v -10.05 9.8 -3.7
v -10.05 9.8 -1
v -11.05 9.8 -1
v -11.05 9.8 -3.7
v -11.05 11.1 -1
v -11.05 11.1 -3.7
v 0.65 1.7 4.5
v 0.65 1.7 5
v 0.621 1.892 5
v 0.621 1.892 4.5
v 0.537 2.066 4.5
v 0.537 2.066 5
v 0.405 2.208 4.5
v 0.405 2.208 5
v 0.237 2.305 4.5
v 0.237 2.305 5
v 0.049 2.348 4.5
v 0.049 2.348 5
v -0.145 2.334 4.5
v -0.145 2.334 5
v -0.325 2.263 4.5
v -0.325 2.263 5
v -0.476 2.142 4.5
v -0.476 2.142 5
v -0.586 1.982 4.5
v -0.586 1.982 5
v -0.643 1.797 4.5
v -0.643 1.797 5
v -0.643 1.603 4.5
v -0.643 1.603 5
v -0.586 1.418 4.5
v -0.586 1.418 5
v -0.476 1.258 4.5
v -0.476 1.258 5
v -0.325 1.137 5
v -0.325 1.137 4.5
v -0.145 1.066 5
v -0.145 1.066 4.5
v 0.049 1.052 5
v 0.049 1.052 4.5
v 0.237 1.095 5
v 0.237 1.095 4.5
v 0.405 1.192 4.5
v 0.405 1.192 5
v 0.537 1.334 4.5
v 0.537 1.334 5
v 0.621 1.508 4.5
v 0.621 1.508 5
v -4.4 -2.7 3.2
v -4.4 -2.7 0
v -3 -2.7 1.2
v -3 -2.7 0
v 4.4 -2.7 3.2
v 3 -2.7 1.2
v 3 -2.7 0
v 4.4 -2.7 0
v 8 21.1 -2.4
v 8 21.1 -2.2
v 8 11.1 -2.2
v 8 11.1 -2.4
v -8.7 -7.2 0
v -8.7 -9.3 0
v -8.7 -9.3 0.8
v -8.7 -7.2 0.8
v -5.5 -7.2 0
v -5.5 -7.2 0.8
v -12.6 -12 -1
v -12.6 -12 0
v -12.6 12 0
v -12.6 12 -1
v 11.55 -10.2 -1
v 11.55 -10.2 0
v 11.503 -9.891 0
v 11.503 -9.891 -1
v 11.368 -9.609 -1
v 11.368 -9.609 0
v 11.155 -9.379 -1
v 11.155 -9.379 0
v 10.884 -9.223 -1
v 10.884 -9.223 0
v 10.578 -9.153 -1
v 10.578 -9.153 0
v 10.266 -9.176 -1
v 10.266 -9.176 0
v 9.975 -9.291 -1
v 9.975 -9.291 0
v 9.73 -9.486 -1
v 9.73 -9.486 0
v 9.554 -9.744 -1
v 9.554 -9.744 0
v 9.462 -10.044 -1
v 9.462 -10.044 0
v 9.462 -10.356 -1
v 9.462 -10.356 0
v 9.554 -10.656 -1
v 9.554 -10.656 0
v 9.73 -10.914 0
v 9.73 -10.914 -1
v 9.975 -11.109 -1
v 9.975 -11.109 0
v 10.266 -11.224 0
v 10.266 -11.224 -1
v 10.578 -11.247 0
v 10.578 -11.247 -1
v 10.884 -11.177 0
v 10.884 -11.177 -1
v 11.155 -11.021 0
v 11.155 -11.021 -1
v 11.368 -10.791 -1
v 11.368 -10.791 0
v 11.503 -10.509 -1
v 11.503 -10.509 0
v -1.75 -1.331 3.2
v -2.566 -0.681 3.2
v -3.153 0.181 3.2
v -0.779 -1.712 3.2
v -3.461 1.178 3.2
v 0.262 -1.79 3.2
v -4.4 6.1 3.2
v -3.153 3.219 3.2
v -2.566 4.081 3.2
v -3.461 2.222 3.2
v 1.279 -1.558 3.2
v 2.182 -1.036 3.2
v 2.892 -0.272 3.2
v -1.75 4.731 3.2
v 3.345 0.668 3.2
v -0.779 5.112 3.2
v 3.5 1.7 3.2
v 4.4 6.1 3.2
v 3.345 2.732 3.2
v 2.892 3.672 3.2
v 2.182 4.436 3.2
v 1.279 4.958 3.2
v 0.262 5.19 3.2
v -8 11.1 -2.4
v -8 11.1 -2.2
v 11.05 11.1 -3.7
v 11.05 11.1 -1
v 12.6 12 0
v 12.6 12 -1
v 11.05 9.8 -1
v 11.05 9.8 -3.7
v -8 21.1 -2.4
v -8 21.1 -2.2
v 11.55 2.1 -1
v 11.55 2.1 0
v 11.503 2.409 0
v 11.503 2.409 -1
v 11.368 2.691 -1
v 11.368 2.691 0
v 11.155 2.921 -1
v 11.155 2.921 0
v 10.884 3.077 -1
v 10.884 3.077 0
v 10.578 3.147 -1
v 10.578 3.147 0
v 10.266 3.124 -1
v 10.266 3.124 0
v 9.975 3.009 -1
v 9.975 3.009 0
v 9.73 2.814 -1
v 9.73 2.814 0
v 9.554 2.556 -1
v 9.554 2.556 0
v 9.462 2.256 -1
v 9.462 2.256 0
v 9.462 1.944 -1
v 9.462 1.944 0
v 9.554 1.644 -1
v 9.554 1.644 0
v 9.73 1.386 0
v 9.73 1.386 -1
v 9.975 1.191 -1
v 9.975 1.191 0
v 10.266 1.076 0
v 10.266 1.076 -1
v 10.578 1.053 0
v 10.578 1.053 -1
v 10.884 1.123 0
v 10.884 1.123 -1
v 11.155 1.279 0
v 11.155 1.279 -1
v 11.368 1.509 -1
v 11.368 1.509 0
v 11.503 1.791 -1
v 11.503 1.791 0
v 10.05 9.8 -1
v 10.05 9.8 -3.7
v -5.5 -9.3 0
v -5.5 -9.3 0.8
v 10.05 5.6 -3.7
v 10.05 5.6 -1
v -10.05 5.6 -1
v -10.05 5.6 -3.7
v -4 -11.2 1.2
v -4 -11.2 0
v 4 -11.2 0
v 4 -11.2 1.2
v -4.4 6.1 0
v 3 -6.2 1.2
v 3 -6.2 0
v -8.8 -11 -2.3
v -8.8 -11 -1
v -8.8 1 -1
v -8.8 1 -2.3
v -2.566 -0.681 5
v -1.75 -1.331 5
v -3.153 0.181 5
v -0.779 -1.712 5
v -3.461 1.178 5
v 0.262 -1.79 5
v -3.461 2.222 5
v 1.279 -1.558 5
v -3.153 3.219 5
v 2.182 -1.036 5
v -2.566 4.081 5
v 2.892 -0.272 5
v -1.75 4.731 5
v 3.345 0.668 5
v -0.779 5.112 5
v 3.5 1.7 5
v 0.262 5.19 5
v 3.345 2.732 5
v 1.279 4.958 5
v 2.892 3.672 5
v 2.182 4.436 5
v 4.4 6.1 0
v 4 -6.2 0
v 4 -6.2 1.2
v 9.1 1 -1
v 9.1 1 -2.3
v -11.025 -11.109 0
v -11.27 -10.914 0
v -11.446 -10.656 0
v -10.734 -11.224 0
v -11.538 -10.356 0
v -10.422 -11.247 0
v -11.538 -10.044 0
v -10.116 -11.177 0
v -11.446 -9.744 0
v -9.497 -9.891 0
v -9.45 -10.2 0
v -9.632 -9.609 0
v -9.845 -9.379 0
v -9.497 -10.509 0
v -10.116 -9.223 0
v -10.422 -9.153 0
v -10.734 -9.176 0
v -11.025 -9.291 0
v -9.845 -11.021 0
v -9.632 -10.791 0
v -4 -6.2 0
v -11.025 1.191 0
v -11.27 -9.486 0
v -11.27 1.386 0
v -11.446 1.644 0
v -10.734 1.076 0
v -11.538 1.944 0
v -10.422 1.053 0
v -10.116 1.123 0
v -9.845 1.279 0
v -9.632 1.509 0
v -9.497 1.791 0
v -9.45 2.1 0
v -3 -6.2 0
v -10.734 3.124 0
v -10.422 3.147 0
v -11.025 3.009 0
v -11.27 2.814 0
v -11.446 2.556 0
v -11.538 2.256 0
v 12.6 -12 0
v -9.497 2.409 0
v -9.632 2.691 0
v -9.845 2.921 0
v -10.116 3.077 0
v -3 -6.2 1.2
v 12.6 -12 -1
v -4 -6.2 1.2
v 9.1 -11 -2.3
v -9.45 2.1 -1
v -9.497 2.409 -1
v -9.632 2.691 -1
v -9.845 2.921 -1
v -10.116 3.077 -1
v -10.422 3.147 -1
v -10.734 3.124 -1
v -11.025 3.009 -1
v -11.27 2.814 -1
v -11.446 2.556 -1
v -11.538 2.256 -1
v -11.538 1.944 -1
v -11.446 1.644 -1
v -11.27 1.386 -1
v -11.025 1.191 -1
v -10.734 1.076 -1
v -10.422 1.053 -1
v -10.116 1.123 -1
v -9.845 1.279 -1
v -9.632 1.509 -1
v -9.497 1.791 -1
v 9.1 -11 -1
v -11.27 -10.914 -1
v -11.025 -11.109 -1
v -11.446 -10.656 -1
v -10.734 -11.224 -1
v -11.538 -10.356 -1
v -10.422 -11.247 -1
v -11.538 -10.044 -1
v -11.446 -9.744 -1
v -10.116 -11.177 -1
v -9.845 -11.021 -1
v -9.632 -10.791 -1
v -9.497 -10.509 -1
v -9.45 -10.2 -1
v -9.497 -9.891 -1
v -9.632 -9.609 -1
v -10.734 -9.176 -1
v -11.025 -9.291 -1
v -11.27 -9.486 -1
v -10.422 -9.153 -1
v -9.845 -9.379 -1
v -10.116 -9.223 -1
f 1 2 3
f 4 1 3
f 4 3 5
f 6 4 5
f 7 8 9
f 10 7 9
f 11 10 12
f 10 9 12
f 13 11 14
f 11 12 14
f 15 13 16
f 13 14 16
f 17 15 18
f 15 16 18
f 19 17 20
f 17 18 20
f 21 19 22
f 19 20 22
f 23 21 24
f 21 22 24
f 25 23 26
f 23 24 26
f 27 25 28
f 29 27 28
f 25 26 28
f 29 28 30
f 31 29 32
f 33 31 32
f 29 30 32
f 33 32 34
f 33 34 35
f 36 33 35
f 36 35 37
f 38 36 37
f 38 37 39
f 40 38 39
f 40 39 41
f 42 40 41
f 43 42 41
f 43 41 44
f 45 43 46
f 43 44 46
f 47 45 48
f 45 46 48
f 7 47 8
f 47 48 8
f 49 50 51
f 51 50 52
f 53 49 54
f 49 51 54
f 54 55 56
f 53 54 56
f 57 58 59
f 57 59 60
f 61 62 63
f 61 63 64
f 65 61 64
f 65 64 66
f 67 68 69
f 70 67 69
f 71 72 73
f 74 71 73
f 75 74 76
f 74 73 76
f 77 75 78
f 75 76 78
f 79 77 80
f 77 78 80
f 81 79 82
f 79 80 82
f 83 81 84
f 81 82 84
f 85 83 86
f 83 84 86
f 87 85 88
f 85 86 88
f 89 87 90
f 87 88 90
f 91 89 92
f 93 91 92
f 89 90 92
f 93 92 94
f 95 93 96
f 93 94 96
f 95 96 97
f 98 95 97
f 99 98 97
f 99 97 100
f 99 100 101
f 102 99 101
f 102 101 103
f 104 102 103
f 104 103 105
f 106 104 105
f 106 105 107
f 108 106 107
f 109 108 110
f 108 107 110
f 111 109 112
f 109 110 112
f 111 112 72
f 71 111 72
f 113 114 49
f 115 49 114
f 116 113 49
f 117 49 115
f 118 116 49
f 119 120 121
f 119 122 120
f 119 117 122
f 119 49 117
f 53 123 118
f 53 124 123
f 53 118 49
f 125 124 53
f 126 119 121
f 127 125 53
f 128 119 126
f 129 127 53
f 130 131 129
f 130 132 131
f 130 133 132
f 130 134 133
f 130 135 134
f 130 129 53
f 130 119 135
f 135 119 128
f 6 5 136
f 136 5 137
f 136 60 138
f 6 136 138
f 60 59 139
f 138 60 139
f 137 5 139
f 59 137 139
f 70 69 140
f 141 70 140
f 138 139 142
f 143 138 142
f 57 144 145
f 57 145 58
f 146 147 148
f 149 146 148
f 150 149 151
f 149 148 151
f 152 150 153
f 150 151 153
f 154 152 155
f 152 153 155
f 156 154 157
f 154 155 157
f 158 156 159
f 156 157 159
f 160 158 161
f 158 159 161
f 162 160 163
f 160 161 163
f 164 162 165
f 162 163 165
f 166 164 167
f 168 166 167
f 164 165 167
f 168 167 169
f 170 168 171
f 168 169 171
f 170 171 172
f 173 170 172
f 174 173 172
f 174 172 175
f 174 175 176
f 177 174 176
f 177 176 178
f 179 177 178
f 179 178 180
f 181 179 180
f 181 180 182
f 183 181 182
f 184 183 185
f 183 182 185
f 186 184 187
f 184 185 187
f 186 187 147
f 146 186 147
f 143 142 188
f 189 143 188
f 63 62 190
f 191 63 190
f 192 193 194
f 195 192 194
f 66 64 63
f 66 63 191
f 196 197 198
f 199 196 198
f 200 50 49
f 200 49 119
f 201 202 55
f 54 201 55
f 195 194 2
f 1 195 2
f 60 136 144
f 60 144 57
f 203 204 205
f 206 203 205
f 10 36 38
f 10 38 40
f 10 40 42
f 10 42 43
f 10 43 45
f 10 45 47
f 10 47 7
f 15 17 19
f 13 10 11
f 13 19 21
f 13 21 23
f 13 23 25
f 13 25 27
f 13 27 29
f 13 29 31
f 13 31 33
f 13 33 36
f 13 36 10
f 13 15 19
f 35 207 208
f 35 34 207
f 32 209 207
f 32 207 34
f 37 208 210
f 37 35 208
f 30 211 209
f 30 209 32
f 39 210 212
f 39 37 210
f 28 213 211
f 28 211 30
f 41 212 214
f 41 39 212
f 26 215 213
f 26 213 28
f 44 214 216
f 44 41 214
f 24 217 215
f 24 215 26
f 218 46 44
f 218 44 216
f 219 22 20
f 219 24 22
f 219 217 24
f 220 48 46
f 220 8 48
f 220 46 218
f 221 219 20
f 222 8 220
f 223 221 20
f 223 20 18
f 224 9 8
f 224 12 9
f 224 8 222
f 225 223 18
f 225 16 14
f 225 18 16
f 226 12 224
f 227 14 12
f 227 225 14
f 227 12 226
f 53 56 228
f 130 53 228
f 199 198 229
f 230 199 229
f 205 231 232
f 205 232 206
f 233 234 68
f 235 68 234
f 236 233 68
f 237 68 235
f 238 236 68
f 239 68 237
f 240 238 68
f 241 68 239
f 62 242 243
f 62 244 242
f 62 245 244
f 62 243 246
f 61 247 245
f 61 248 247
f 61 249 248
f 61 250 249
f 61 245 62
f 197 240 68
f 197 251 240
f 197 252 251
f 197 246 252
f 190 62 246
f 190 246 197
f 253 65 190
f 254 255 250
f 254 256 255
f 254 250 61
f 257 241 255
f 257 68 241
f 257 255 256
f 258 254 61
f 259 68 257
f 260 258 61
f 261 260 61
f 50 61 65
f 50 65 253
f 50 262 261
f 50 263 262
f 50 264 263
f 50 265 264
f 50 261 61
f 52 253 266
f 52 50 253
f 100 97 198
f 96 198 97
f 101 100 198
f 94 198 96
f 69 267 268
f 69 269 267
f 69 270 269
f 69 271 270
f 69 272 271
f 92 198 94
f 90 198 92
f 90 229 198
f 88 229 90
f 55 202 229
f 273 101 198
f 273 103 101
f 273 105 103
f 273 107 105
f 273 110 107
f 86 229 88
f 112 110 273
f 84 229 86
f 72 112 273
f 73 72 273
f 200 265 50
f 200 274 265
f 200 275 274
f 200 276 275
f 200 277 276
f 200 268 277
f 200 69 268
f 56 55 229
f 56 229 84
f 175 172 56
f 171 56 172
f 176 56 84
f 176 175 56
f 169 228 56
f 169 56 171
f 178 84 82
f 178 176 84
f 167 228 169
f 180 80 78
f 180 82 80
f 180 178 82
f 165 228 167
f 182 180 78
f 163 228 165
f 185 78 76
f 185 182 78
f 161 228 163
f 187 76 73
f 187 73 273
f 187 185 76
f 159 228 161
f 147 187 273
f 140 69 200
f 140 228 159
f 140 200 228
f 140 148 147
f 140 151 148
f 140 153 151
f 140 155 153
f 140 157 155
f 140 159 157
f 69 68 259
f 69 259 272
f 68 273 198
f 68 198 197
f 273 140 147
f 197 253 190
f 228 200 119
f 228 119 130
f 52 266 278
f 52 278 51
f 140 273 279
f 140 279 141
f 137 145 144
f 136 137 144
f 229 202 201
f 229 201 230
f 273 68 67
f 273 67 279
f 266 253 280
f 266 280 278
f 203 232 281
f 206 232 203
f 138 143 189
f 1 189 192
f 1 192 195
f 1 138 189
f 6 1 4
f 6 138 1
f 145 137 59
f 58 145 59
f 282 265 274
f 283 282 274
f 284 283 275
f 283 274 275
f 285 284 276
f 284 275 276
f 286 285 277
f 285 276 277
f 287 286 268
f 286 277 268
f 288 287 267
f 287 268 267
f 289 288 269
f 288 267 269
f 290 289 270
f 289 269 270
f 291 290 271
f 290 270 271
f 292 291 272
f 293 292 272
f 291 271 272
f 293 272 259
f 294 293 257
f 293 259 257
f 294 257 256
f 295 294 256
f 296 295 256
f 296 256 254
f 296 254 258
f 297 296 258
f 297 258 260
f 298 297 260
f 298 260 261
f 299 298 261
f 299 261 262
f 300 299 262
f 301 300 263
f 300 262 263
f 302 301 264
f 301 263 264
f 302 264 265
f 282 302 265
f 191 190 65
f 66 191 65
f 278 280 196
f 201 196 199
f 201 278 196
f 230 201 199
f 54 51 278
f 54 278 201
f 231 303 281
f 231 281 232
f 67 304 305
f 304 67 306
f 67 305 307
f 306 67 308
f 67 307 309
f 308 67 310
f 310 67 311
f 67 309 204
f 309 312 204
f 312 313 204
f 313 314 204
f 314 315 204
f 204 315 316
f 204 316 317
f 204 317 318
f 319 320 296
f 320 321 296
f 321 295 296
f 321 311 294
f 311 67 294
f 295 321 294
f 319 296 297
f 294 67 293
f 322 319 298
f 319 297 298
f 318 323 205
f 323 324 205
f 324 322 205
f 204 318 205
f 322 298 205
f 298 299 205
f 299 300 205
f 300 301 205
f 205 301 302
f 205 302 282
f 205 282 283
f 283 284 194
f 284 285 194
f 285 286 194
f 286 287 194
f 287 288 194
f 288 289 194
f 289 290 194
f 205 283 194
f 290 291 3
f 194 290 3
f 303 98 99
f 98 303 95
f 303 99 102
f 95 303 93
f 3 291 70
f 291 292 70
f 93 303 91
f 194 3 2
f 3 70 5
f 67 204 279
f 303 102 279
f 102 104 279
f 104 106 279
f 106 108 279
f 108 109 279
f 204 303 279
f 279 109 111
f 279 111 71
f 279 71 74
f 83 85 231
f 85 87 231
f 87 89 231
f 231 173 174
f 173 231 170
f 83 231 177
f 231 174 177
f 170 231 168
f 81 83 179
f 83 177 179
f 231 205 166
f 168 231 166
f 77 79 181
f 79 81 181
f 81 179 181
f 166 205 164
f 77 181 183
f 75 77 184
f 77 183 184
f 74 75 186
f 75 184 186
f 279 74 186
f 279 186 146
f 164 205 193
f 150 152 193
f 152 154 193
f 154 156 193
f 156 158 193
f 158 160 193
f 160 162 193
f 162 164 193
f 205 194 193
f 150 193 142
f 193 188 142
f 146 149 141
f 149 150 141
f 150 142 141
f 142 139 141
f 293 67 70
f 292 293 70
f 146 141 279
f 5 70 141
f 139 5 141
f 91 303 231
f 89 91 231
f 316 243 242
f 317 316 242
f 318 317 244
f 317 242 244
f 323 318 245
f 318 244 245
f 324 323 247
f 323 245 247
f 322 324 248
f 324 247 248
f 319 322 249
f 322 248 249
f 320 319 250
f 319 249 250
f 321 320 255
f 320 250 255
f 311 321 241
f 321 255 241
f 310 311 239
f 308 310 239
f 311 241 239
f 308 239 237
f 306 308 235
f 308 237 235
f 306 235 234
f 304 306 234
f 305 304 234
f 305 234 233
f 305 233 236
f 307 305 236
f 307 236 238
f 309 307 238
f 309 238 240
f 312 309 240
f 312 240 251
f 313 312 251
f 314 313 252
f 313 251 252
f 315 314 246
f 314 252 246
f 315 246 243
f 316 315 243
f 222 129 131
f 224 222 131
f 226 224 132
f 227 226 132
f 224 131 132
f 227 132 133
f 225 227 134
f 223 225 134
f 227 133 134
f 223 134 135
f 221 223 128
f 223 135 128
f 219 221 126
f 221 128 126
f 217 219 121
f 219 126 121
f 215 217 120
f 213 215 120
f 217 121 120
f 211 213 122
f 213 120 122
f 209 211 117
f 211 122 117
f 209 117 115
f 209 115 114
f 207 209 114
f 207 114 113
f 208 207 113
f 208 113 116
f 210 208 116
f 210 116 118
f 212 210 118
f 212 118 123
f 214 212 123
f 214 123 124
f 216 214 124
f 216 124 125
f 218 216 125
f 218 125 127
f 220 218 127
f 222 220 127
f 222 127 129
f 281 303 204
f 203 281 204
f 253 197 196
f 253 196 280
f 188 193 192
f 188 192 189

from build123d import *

# Parameters (mm, degrees)
SKICA1_W                 = 25.2
SKICA1_H                 = 24
SKICA1_R                 = 1.05
SKICA1_W_2               = 8.8
SKICA1_H_2               = 8.8
SKICA1_R_2               = 3.5
P_IDAT_VYSUNUT_M1_DEPTH  = 1
SKICA1_3_W               = 8.8
SKICA1_3_H               = 8.8
SKICA1_3_R               = 3.5
P_IDAT_VYSUNUT_M2_DEPTH  = 3.2
SKICA1_4_R               = 3.5
P_IDAT_VYSUNUT_M3_DEPTH  = 5
SKICA2_W                 = 8
SKICA2_H                 = 5
SKICA2_W_2               = 6
SKICA2_H_2               = 3.5
P_IDAT_VYSUNUT_M4_DEPTH  = 1.2
SKICA3_W                 = 20.1
SKICA3_H                 = 4.2
P_IDAT_VYSUNUT_M5_DEPTH  = 2.7
SKICA4_W                 = 17.9
SKICA4_H                 = 12
P_IDAT_VYSUNUT_M6_DEPTH  = 1.3
SKICA5_W                 = 3.2
SKICA5_H                 = 2.1
P_IDAT_VYSUNUT_M7_DEPTH  = 0.8
SKICA6_R                 = 0.65
ODEBRAT_VYSUNUT_M1_DEPTH = 0.5
SKICA7_W                 = 16
SKICA7_H                 = 0.2
P_IDAT_VYSUNUT_M9_DEPTH  = 10


with BuildPart() as part:
    # Skica1 → P_idat vysunut_m1 (new body)
    with BuildSketch(Plane.XY):
        Rectangle(SKICA1_W, SKICA1_H)
        with Locations((10.5, 2.1)):
            Circle(SKICA1_R, mode=Mode.SUBTRACT)
        with Locations((-10.5, 2.1)):
            Circle(SKICA1_R, mode=Mode.SUBTRACT)
        with Locations((10.5, -10.2)):
            Circle(SKICA1_R, mode=Mode.SUBTRACT)
        with Locations((-10.5, -10.2)):
            Circle(SKICA1_R, mode=Mode.SUBTRACT)
        with Locations((0, 1.7)):
            Rectangle(SKICA1_W_2, SKICA1_H_2, mode=Mode.SUBTRACT)
        with Locations((0, 1.7)):
            Rectangle(SKICA1_W_2, SKICA1_H_2)
        with Locations((0, 1.7)):
            Circle(SKICA1_R_2, mode=Mode.SUBTRACT)
        with Locations((0, 1.7)):
            Circle(SKICA1_R_2)
    extrude(amount=-P_IDAT_VYSUNUT_M1_DEPTH)

    # Skica1_3 → P_idat vysunut_m2 (add)
    with BuildSketch(Plane.XY):
        with Locations((0, 1.7)):
            Rectangle(SKICA1_3_W, SKICA1_3_H)
        with Locations((0, 1.7)):
            Circle(SKICA1_3_R, mode=Mode.SUBTRACT)
    extrude(amount=P_IDAT_VYSUNUT_M2_DEPTH)

    # Skica1_4 → P_idat vysunut_m3 (add)
    with BuildSketch(Plane.XY):
        with Locations((0, 1.7)):
            Circle(SKICA1_4_R)
    extrude(amount=P_IDAT_VYSUNUT_M3_DEPTH)

    # Skica2 → P_idat vysunut_m4 (add)
    with BuildSketch(Plane.XY):
        with Locations((0, -8.7)):
            Rectangle(SKICA2_W, SKICA2_H)
        with Locations((0, -4.45)):
            Rectangle(SKICA2_W_2, SKICA2_H_2)
    extrude(amount=P_IDAT_VYSUNUT_M4_DEPTH)

    # Skica3 → P_idat vysunut_m5 (add)
    with BuildSketch(Plane(origin=(0, 0, -1), x_dir=(-1, 0, 0), z_dir=(0, 0, -1))):
        with Locations((0, 7.7)):
            Rectangle(SKICA3_W, SKICA3_H)
        Polygon((-11.05, 9.8), (-10.05, 9.8), (10.05, 9.8), (11.05, 9.8), (11.05, 11.1), (-11.05, 11.1), align=None)
    extrude(amount=P_IDAT_VYSUNUT_M5_DEPTH)

    # Skica4 → P_idat vysunut_m6 (add)
    with BuildSketch(Plane(origin=(0, 0, -1), x_dir=(-1, 0, 0), z_dir=(0, 0, -1))):
        with Locations((-0.15, -5)):
            Rectangle(SKICA4_W, SKICA4_H)
    extrude(amount=P_IDAT_VYSUNUT_M6_DEPTH)

    # Skica5 → P_idat vysunut_m7 (add)
    with BuildSketch(Plane.XY):
        with Locations((-7.1, -8.25)):
            Rectangle(SKICA5_W, SKICA5_H)
    extrude(amount=P_IDAT_VYSUNUT_M7_DEPTH)

    # Skica6 → Odebrat vysunut_m1 (cut)
    with BuildSketch(Plane.XY.offset(5)):
        with Locations((0, 1.7)):
            Circle(SKICA6_R)
    extrude(amount=-ODEBRAT_VYSUNUT_M1_DEPTH, mode=Mode.SUBTRACT)

    # Skica7 → P_idat vysunut_m9 (add)
    with BuildSketch(Plane(origin=(0, 11.1, 0), x_dir=(1, 0, 0), z_dir=(0, 1, 0))):
        with Locations((0, 2.3)):
            Rectangle(SKICA7_W, SKICA7_H)
    extrude(amount=P_IDAT_VYSUNUT_M9_DEPTH)


solid = part.part
